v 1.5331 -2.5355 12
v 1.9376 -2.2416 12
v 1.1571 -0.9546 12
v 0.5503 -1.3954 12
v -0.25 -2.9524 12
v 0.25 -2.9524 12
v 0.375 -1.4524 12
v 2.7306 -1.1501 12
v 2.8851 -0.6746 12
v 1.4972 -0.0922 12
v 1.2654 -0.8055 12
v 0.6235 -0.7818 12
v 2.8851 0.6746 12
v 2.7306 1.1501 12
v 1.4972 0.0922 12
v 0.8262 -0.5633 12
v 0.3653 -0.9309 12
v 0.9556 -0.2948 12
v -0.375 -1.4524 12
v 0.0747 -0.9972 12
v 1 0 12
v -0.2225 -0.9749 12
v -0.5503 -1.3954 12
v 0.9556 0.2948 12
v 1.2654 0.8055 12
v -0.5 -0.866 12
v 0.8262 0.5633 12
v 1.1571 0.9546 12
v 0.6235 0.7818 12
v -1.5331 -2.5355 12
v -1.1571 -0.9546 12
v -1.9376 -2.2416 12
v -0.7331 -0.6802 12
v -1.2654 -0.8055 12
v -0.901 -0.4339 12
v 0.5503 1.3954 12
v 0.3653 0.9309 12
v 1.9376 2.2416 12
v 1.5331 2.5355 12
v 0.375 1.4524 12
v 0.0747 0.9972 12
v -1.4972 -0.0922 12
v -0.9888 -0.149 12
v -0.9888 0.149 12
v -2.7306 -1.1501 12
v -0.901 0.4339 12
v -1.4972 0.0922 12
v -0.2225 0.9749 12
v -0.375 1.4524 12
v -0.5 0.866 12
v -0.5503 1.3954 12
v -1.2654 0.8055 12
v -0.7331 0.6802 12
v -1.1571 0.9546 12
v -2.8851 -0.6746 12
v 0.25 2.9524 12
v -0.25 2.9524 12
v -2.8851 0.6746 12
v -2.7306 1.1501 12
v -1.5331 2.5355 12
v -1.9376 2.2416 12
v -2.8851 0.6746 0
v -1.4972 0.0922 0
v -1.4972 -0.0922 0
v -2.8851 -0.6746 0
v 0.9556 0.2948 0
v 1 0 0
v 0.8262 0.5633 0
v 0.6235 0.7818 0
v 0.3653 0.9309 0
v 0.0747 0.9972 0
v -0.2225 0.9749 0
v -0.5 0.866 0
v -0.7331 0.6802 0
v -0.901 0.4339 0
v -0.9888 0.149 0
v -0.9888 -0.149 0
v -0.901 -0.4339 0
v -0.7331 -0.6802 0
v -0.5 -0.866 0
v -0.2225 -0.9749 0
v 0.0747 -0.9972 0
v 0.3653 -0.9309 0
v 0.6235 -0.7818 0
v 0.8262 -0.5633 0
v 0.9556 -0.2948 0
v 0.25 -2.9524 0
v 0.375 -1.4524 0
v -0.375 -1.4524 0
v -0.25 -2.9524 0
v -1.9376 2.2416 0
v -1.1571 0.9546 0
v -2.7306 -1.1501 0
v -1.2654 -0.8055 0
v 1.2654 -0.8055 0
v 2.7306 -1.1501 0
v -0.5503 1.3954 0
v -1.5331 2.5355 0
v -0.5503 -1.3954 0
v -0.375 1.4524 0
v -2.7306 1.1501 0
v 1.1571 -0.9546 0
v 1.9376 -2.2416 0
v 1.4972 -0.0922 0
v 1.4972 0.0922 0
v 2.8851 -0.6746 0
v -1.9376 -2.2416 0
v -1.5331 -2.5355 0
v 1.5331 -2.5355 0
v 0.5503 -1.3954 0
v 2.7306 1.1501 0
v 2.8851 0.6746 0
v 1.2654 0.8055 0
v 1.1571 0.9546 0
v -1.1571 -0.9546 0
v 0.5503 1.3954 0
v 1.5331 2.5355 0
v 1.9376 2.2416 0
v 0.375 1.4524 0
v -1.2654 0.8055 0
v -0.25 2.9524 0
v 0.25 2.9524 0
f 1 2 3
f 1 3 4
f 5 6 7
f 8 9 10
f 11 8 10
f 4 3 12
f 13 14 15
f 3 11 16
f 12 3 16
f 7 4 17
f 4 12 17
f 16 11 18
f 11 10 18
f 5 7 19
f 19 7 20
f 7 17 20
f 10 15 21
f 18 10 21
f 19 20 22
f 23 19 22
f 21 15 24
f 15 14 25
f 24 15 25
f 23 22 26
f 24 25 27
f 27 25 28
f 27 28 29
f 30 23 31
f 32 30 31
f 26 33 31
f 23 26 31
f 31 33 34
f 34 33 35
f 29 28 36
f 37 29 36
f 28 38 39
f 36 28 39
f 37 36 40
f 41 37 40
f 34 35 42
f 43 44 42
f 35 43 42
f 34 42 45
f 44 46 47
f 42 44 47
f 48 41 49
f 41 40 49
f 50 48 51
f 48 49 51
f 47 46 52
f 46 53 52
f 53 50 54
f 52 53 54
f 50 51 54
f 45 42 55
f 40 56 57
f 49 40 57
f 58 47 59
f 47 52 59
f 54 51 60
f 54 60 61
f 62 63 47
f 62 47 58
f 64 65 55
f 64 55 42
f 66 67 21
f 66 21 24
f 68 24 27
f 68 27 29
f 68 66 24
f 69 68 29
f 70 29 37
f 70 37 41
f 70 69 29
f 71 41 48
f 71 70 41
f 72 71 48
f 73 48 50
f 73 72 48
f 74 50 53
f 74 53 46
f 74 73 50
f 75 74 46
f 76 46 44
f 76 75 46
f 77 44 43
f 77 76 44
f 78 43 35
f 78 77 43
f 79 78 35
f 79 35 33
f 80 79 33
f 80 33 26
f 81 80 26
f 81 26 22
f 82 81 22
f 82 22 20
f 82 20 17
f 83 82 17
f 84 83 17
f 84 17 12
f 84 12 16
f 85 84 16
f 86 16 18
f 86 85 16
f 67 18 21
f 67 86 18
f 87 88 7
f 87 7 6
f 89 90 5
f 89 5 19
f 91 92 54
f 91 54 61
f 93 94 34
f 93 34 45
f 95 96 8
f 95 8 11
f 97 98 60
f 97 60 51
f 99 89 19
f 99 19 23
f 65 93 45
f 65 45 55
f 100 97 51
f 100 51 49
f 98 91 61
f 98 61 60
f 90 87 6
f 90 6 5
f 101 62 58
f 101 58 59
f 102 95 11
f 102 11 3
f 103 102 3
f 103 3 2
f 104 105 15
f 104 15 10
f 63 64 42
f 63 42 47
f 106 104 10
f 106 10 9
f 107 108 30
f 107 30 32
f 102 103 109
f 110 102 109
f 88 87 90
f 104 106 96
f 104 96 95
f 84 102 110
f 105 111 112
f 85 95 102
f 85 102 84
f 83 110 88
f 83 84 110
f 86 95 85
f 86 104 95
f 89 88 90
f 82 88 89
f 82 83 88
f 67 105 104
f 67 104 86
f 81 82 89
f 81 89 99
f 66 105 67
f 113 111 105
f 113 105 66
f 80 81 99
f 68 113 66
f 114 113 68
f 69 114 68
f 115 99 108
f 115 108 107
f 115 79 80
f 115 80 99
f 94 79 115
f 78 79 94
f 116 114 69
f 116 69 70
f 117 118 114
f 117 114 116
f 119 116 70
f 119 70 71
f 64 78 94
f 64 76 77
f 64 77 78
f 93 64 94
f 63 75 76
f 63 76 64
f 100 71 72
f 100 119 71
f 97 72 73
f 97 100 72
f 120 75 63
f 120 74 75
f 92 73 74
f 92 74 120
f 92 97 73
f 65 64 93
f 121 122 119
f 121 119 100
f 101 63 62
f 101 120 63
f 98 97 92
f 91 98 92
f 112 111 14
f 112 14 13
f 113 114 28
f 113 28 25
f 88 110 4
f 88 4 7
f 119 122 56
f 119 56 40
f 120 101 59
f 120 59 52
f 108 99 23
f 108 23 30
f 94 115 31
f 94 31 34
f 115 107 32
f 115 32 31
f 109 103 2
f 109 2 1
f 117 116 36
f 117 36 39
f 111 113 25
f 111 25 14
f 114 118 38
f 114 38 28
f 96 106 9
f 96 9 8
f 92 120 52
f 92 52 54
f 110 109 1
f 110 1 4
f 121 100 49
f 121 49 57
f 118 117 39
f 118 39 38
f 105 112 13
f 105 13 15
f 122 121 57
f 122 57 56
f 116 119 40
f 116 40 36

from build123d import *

# Parameters (mm, degrees)
SKETCH2_R           = 1
BOSS_EXTRUDE1_DEPTH = 12


with BuildPart() as part:
    # Sketch2 → Boss-Extrude1 (new body)
    with BuildSketch(Plane.XY):
        Polygon((-0.25, 2.952368755), (0.25, 2.952368755), (0.375, 1.452368755), (0.550299562, 1.395410474), (1.533104565, 2.535462809), (1.937613062, 2.241570183), (1.157062308, 0.954571535), (1.265403395, 0.805452821), (2.730615294, 1.150096248), (2.885123791, 0.67456799), (1.497166141, 0.092160434), (1.497166141, -0.092160434), (2.885123791, -0.67456799), (2.730615294, -1.150096248), (1.265403395, -0.805452821), (1.157062308, -0.954571535), (1.937613062, -2.241570183), (1.533104565, -2.535462809), (0.550299562, -1.395410474), (0.375, -1.452368755), (0.25, -2.952368755), (-0.25, -2.952368755), (-0.375, -1.452368755), (-0.550299562, -1.395410474), (-1.533104565, -2.535462809), (-1.937613062, -2.241570183), (-1.157062308, -0.954571535), (-1.265403395, -0.805452821), (-2.730615294, -1.150096248), (-2.885123791, -0.67456799), (-1.497166141, -0.092160434), (-1.497166141, 0.092160434), (-2.885123791, 0.67456799), (-2.730615294, 1.150096248), (-1.265403395, 0.805452821), (-1.157062308, 0.954571535), (-1.937613062, 2.241570183), (-1.533104565, 2.535462809), (-0.550299562, 1.395410474), (-0.375, 1.452368755), align=None)
        Circle(SKETCH2_R, mode=Mode.SUBTRACT)
    extrude(amount=BOSS_EXTRUDE1_DEPTH)


solid = part.part
